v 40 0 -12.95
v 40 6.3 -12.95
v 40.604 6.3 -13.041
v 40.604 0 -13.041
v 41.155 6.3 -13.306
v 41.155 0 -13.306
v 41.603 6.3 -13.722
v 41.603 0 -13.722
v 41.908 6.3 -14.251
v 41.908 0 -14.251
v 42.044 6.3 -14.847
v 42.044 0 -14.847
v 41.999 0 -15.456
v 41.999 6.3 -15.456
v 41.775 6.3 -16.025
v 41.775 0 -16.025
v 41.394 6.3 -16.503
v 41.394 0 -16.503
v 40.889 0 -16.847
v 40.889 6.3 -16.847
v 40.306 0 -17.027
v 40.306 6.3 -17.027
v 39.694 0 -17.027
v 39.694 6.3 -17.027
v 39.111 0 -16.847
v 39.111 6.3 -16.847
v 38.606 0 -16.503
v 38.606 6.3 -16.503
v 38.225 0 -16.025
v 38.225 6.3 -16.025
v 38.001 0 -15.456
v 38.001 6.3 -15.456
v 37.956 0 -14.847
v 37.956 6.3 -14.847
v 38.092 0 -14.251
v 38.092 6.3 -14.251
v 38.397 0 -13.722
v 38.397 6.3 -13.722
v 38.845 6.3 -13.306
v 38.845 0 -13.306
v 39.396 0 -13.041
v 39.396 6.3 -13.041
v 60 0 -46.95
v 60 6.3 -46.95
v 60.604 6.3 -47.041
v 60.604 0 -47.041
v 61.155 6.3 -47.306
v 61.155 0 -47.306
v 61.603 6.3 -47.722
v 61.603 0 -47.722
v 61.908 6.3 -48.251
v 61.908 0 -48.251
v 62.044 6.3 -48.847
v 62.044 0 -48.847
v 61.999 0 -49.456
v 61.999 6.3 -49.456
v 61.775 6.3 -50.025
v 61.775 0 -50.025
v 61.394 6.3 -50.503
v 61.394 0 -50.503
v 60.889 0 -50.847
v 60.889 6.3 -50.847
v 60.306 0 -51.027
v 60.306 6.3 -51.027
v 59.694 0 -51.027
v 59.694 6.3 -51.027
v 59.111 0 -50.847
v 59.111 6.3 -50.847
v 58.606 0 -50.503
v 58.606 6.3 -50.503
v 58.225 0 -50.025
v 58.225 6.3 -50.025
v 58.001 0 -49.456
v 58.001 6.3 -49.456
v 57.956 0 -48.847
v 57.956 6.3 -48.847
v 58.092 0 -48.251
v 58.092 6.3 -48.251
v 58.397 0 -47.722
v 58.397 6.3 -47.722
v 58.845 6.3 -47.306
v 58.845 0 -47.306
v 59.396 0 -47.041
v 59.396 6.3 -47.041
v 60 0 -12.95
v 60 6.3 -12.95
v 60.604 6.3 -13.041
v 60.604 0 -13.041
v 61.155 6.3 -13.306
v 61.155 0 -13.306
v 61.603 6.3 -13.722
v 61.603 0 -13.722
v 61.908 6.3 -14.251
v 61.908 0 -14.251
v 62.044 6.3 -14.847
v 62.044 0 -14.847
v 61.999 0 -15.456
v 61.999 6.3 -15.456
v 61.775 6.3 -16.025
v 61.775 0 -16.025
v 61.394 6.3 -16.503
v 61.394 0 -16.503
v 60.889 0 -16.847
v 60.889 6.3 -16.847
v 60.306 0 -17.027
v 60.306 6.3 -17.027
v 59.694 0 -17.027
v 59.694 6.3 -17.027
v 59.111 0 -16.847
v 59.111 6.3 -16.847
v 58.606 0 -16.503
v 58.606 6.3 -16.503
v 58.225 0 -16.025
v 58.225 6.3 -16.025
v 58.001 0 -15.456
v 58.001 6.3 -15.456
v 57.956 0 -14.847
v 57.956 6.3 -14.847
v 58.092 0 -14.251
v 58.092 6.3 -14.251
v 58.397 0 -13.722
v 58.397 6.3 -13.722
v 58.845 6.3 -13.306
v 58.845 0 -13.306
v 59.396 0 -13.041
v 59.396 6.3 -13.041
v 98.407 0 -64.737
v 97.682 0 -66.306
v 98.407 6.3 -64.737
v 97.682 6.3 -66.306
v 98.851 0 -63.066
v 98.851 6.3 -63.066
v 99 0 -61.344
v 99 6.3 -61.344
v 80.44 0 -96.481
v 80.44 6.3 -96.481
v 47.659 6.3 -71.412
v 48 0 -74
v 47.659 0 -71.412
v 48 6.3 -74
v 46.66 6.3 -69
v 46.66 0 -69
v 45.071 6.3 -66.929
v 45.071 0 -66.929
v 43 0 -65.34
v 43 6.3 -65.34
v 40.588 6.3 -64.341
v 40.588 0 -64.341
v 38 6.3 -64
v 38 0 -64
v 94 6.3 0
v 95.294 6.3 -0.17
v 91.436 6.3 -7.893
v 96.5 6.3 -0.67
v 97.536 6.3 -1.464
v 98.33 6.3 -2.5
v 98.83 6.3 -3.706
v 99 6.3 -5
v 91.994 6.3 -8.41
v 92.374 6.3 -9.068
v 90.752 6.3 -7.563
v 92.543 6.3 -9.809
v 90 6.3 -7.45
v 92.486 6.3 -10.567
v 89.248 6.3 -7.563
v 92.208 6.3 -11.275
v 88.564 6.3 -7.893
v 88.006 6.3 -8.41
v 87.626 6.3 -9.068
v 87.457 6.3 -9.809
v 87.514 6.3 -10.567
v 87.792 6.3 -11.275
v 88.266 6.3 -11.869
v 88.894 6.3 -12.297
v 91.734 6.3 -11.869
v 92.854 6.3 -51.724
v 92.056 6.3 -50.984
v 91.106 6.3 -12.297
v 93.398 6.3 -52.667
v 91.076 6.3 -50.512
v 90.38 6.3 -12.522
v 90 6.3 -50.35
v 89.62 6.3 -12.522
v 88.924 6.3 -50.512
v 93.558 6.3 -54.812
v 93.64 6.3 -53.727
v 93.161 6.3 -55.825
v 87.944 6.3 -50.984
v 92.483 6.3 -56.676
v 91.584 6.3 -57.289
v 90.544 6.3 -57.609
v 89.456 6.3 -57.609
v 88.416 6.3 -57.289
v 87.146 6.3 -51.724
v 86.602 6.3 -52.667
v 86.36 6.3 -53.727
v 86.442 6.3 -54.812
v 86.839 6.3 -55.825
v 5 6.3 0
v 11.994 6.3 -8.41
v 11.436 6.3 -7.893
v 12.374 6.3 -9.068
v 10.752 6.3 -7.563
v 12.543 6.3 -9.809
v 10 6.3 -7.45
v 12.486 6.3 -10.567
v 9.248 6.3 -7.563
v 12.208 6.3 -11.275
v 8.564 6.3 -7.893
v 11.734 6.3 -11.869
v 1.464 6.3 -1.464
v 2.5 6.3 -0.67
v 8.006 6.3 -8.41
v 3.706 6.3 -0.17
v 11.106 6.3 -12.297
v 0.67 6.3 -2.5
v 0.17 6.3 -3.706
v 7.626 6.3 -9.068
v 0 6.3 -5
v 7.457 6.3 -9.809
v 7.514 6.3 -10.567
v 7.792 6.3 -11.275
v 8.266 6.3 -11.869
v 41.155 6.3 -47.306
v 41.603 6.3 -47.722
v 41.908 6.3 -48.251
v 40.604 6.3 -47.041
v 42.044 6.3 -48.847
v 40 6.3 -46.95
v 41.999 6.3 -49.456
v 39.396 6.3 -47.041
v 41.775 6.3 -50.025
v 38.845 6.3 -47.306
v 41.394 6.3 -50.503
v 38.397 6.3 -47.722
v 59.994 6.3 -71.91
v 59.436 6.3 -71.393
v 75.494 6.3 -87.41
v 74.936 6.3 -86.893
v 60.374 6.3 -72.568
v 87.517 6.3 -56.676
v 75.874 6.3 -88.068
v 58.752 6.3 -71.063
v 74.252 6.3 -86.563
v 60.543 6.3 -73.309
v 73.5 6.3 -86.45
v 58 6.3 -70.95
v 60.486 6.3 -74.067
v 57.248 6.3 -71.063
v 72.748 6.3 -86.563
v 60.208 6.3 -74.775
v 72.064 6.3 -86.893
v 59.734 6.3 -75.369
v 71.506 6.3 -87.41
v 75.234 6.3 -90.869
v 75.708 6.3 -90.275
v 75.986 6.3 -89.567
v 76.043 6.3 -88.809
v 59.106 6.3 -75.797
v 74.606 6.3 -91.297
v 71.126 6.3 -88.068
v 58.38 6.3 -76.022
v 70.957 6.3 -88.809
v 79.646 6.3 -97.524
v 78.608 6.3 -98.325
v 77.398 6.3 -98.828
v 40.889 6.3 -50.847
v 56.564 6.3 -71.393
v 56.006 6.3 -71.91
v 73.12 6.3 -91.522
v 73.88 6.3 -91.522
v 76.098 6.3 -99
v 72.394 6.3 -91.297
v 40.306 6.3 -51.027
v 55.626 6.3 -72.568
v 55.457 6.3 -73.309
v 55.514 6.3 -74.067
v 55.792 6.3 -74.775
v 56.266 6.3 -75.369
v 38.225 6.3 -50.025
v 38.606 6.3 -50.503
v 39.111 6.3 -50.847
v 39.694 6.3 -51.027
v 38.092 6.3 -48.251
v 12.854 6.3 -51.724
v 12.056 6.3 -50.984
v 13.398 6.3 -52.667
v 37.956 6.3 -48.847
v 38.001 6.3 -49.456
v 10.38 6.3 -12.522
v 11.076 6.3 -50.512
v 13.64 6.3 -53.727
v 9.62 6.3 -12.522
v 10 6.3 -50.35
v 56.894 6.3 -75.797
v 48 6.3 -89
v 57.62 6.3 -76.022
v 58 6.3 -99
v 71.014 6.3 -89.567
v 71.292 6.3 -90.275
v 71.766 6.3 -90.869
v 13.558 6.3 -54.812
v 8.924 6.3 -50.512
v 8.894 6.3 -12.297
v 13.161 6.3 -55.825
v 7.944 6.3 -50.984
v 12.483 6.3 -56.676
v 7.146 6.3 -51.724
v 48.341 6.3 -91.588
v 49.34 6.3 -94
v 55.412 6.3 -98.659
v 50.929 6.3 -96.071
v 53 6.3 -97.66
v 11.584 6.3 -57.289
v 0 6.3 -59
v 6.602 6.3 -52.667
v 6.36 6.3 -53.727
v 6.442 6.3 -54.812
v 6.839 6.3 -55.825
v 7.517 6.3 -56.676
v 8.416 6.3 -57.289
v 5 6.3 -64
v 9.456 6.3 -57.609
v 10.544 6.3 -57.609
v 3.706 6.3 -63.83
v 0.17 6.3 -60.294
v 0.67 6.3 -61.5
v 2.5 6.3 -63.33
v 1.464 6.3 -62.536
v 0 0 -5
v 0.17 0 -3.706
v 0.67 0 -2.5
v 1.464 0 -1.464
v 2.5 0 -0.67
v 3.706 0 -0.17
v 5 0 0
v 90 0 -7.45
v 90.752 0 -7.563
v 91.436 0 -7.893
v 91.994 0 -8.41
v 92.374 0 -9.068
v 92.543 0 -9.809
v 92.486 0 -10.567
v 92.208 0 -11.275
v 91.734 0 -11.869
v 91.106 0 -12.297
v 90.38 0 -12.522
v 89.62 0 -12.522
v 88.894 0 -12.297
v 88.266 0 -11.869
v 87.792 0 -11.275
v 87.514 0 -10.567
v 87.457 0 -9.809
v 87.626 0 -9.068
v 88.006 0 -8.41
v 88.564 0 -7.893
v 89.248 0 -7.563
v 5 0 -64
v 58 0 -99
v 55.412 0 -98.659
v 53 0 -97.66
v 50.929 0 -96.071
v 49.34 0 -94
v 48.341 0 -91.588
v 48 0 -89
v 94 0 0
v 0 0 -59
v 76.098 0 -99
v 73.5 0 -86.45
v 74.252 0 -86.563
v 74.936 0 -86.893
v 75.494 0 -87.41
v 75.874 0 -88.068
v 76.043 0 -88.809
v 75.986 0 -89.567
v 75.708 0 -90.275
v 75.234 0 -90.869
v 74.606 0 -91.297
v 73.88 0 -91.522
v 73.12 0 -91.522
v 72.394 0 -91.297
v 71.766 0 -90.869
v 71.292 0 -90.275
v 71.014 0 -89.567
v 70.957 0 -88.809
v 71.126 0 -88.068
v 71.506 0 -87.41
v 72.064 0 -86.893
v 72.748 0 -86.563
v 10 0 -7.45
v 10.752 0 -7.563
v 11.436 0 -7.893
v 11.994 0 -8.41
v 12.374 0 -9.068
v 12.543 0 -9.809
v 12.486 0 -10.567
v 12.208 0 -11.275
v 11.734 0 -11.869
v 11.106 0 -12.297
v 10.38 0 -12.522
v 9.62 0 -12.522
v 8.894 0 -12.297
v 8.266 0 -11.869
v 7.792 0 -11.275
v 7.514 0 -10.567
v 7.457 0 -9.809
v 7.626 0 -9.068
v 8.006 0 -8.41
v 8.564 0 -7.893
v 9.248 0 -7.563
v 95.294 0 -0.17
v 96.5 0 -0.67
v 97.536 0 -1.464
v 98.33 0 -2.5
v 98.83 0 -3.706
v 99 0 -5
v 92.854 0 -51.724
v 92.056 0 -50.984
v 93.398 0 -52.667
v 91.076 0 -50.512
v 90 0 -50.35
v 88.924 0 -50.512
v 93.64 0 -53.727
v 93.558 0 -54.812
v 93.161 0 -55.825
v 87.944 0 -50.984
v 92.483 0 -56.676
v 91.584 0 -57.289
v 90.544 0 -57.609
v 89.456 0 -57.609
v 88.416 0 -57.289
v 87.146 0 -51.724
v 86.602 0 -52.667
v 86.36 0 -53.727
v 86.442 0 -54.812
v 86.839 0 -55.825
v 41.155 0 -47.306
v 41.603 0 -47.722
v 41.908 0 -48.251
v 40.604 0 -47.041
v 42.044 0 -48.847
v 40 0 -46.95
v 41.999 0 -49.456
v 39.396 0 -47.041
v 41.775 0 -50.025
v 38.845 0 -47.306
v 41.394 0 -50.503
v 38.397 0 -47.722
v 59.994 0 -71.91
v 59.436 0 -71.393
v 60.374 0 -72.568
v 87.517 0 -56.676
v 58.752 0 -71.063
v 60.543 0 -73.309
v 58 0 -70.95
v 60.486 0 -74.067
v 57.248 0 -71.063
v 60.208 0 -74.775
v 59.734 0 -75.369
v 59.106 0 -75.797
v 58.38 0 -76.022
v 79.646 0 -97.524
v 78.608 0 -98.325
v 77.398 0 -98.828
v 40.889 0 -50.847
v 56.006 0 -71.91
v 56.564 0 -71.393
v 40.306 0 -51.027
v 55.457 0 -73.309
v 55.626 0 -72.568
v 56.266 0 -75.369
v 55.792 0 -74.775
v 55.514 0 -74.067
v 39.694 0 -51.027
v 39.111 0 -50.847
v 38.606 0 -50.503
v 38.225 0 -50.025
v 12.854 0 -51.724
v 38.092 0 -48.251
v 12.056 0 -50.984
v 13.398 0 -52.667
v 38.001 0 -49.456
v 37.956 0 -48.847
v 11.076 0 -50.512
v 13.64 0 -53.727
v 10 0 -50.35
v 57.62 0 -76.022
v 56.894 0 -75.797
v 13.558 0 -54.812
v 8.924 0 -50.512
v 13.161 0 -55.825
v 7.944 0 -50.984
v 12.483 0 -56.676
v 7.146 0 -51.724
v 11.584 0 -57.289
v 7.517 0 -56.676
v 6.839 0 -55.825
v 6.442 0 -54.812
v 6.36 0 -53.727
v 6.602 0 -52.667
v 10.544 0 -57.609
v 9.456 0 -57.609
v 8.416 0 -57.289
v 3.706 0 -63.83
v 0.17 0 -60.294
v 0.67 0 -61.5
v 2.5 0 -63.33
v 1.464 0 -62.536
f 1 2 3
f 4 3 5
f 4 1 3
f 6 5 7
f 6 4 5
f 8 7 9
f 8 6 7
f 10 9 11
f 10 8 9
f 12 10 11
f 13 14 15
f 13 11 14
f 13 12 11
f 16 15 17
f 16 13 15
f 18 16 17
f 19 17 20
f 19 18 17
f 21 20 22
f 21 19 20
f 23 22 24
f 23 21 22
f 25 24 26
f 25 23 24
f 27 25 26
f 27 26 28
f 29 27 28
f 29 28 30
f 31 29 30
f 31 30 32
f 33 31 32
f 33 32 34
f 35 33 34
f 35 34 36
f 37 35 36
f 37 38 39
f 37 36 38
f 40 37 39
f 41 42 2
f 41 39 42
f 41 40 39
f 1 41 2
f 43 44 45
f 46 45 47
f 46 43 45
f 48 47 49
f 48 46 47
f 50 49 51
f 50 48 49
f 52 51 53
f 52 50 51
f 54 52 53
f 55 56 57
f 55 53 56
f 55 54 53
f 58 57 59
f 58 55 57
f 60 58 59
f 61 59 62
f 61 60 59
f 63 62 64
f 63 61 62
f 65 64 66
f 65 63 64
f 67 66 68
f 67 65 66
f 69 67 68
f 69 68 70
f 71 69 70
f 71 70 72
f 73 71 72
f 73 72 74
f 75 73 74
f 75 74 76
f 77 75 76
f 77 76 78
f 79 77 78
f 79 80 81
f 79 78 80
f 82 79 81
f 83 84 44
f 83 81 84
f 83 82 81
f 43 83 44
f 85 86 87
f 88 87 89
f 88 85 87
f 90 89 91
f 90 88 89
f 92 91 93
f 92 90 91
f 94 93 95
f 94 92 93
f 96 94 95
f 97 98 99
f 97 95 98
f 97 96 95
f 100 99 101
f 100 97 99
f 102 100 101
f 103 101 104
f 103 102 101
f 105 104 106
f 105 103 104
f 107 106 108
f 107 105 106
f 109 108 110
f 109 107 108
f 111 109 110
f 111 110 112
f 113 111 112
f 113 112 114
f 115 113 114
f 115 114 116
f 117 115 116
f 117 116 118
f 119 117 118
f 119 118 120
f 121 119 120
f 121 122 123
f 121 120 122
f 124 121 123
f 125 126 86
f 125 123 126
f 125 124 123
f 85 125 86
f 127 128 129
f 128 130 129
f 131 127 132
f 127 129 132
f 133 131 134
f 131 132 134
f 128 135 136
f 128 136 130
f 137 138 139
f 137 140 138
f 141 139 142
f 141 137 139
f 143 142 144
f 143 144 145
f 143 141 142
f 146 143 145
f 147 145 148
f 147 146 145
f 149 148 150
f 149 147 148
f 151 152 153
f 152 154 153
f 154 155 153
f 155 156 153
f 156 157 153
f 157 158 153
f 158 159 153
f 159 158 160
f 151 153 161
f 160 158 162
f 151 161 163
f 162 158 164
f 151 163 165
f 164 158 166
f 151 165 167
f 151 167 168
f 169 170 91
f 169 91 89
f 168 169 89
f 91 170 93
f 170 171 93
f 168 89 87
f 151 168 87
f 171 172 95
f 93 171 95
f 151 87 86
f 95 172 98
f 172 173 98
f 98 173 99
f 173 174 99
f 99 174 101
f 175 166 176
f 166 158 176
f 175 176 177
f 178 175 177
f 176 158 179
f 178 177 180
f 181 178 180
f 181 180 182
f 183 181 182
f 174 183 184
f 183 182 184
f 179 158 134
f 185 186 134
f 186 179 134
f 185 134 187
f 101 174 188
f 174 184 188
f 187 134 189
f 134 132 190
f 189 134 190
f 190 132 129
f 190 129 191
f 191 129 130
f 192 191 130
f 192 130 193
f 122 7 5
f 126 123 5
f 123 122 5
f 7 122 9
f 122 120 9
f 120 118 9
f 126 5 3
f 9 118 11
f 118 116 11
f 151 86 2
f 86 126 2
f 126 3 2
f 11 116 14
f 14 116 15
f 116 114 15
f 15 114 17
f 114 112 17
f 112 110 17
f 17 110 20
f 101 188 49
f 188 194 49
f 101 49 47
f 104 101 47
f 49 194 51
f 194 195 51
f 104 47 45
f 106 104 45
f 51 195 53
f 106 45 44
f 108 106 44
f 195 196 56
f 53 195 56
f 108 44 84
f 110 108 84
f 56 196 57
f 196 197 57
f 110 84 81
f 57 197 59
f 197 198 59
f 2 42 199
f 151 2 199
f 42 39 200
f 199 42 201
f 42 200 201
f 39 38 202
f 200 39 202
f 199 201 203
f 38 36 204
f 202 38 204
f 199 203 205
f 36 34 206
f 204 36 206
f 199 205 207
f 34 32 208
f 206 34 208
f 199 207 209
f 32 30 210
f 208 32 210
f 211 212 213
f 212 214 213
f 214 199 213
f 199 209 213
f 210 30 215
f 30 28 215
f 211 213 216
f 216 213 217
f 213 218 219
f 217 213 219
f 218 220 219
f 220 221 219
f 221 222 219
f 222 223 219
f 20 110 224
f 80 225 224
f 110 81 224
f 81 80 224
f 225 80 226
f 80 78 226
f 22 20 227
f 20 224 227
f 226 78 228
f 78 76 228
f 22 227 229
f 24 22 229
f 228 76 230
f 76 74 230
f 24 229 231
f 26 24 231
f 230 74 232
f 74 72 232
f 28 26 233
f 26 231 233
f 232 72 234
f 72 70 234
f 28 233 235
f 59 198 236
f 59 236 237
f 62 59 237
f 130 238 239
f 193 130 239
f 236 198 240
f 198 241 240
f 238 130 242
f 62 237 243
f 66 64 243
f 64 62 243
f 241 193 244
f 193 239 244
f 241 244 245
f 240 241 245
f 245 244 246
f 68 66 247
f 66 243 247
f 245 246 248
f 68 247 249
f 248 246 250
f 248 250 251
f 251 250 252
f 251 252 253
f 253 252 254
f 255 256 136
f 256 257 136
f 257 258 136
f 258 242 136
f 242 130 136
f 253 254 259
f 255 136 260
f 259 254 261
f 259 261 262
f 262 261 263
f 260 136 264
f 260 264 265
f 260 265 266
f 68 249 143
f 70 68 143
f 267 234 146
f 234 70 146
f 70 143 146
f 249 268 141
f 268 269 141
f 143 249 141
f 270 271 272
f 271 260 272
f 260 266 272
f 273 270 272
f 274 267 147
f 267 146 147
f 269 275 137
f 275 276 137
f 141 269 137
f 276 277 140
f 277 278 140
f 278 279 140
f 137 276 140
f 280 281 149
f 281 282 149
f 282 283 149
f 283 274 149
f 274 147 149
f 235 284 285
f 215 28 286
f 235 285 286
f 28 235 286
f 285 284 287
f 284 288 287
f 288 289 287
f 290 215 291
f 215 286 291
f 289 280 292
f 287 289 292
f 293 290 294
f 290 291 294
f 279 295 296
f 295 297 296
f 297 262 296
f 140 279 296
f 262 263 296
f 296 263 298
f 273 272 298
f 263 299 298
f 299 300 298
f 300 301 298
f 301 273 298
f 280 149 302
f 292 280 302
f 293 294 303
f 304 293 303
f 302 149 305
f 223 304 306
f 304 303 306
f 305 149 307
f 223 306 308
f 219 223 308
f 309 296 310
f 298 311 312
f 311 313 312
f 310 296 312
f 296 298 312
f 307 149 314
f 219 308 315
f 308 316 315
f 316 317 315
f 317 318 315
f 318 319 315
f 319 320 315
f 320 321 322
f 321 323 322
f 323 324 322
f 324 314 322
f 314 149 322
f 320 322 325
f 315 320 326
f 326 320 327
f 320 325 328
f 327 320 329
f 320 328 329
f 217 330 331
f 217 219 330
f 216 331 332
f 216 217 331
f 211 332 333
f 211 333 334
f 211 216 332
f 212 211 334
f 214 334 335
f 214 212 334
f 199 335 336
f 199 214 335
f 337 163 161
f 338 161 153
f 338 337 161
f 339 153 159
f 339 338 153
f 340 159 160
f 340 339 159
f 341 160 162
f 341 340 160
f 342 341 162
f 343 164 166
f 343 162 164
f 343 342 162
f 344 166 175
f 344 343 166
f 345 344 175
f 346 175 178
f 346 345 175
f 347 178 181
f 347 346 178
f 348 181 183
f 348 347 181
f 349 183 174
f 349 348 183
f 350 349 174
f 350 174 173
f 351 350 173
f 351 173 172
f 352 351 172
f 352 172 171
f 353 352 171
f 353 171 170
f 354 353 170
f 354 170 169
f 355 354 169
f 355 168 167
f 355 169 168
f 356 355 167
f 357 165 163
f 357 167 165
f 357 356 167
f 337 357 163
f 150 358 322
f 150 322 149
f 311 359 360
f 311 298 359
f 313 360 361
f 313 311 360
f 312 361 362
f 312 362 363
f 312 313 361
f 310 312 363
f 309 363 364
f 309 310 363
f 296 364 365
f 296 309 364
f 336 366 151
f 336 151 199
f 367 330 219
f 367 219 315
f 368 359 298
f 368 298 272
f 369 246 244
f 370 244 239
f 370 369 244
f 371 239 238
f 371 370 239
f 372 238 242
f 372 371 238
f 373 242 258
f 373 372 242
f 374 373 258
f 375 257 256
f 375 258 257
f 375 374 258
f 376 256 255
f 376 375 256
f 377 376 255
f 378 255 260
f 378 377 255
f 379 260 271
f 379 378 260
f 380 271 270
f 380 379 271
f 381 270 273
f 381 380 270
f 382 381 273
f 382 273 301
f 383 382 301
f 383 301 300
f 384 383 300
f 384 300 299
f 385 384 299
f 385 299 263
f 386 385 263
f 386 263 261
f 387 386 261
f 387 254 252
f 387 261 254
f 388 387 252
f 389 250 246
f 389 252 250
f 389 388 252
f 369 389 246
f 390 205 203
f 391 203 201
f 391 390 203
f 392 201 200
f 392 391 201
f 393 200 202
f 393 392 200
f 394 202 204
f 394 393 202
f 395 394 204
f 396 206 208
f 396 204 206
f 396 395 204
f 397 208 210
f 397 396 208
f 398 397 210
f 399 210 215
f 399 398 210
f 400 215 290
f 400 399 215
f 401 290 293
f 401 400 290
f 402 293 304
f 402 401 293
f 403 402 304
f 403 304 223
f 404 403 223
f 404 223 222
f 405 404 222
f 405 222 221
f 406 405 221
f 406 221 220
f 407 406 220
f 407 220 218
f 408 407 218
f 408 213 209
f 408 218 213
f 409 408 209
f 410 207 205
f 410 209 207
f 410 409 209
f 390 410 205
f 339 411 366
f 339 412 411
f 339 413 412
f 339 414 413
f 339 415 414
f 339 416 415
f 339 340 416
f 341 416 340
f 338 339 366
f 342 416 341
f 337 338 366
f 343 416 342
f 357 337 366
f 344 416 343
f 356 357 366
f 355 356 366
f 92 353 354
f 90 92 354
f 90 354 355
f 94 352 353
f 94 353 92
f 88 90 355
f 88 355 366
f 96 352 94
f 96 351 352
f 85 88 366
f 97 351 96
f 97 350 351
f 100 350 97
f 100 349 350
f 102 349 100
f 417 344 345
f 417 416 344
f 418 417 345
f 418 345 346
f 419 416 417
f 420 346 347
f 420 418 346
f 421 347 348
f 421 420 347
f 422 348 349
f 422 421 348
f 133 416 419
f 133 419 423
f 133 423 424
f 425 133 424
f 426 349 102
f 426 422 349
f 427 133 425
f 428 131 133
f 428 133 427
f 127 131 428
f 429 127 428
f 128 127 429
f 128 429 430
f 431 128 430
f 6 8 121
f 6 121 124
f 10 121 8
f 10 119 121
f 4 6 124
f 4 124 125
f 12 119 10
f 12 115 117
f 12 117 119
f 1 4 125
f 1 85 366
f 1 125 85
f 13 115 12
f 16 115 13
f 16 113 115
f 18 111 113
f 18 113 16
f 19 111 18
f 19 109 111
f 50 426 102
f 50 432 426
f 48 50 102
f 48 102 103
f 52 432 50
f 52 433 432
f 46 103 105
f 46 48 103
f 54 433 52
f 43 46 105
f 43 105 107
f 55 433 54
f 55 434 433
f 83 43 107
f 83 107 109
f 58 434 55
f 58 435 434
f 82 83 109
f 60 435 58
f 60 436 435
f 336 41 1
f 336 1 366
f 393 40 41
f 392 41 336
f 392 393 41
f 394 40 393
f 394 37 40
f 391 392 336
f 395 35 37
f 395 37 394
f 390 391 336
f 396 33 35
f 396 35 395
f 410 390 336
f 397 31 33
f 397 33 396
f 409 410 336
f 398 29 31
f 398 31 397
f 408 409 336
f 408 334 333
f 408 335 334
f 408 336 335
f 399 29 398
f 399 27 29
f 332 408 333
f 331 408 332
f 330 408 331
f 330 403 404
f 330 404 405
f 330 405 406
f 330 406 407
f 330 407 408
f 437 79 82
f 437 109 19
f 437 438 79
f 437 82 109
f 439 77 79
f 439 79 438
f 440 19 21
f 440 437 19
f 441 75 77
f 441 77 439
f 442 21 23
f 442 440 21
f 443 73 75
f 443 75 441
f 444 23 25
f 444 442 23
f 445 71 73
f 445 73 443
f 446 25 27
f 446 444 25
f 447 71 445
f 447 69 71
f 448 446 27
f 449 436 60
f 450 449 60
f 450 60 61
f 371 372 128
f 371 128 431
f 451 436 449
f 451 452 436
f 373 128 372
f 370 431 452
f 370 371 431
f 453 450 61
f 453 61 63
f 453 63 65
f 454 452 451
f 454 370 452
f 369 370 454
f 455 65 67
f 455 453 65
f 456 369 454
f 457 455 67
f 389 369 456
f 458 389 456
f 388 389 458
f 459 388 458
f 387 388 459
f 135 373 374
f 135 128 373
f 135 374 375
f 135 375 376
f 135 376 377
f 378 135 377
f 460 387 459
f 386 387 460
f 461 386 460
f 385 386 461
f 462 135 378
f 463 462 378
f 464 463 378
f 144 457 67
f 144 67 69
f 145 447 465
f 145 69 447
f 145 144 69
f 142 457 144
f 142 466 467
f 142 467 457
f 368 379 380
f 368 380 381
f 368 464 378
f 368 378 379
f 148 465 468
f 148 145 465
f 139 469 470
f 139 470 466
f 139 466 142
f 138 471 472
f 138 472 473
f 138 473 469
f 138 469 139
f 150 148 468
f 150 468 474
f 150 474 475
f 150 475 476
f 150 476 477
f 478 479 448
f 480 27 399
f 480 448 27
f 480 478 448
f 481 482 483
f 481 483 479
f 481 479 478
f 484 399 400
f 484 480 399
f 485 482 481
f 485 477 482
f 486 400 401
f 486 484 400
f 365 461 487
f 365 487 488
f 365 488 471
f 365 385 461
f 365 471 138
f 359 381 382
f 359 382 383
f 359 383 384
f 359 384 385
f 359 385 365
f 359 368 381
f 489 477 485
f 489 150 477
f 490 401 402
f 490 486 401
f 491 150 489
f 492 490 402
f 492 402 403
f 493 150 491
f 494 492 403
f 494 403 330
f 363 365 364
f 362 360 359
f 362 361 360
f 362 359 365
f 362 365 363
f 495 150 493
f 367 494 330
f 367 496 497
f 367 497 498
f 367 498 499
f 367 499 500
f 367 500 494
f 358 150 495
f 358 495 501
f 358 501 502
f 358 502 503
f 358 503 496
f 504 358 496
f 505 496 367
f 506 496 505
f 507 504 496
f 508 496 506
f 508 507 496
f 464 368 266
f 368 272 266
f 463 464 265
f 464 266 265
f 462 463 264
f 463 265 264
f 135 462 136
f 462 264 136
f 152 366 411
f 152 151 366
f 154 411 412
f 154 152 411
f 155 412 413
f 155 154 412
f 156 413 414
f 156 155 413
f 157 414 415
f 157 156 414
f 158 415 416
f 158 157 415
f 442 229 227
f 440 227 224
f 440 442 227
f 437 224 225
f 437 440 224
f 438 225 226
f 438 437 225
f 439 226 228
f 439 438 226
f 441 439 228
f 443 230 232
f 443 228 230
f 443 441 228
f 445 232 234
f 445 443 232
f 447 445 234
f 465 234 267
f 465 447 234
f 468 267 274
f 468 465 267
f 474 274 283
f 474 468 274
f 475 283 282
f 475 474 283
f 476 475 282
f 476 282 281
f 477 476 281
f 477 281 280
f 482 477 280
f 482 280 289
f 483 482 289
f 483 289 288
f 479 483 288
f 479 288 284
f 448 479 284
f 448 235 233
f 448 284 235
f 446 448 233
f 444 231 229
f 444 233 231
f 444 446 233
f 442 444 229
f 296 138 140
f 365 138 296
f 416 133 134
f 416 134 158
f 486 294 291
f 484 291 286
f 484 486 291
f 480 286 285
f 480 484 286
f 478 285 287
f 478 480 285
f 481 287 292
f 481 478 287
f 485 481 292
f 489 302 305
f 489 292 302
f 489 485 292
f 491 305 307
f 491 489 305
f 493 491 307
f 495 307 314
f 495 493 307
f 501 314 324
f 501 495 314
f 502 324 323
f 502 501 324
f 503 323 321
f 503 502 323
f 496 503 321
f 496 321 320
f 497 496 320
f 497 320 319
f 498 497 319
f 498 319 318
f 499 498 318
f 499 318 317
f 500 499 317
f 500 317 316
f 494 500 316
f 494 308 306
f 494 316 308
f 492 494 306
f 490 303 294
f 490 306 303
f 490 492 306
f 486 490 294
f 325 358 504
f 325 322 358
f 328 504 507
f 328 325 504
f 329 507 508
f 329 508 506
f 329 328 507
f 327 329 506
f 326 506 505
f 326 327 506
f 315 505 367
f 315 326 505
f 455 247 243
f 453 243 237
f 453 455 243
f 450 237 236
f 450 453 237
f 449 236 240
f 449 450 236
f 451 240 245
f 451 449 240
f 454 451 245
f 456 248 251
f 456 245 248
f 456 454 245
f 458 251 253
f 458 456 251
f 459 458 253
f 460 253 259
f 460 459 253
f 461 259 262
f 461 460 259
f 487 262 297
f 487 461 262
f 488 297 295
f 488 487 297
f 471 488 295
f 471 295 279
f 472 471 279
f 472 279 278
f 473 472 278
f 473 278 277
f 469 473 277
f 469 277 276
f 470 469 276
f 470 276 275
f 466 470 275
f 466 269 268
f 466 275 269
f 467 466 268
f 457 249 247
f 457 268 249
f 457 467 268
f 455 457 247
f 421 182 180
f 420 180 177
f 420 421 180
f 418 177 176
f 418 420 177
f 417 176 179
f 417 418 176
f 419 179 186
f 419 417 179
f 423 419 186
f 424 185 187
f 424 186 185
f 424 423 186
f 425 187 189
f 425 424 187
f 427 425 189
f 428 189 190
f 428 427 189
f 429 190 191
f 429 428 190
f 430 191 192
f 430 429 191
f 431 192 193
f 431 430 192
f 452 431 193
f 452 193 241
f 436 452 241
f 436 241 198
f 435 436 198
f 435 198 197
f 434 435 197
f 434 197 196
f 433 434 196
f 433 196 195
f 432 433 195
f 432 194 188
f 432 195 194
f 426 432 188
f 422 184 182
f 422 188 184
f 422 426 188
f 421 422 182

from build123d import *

# Parameters (mm, degrees)
BOSS_EXTRUDE2_DEPTH = 6.3
SKETCH1_7_R         = 2.55
CUT_EXTRUDE3_DEPTH  = 141.148813766
SKETCH1_8_R         = 3.65
CUT_EXTRUDE4_DEPTH  = 141.148813766
SKETCH1_9_R         = 2.55
CUT_EXTRUDE5_DEPTH  = 141.148813766
SKETCH1_10_R        = 3.65
CUT_EXTRUDE6_DEPTH  = 141.148813766
SKETCH1_11_R        = 2.05
CUT_EXTRUDE8_DEPTH  = 141.148813766
SKETCH1_12_R        = 2.05
CUT_EXTRUDE10_DEPTH = 141.148813766
SKETCH1_13_R        = 2.55
CUT_EXTRUDE11_DEPTH = 141.148813766
SKETCH1_14_R        = 2.05
CUT_EXTRUDE12_DEPTH = 141.148813766
SKETCH1_15_R        = 2.05
CUT_EXTRUDE13_DEPTH = 141.148813766
SKETCH1_16_R        = 2.55
CUT_EXTRUDE14_DEPTH = 141.148813766
FILLET1_R           = 5
FILLET2_R           = 5
FILLET3_R           = 10
FILLET4_R           = 10
FILLET5_R           = 10


with BuildPart() as part:
    # Sketch1 → Boss-Extrude2 (new body)
    with BuildSketch(Plane(origin=(0, 0, 0), x_dir=(1, 0, 0), z_dir=(0, 1, 0))):
        Polygon((0, 64), (48, 64), (48, 99), (79, 99), (99, 64), (99, 0), (0, 0), align=None)
    extrude(amount=BOSS_EXTRUDE2_DEPTH)

    # Sketch1<7> → Cut-Extrude3 (cut, through all)
    with BuildSketch(Plane(origin=(0, 0, 0), x_dir=(1, 0, 0), z_dir=(0, 1, 0))):
        with Locations((73.5, 89)):
            Circle(SKETCH1_7_R)
    extrude(amount=CUT_EXTRUDE3_DEPTH, mode=Mode.SUBTRACT)

    # Sketch1<8> → Cut-Extrude4 (cut, through all)
    with BuildSketch(Plane(origin=(0, 0, 0), x_dir=(1, 0, 0), z_dir=(0, 1, 0))):
        with Locations((90, 54)):
            Circle(SKETCH1_8_R)
    extrude(amount=CUT_EXTRUDE4_DEPTH, mode=Mode.SUBTRACT)

    # Sketch1<9> → Cut-Extrude5 (cut, through all)
    with BuildSketch(Plane(origin=(0, 0, 0), x_dir=(1, 0, 0), z_dir=(0, 1, 0))):
        with Locations((58, 73.5)):
            Circle(SKETCH1_9_R)
    extrude(amount=CUT_EXTRUDE5_DEPTH, mode=Mode.SUBTRACT)

    # Sketch1<10> → Cut-Extrude6 (cut, through all)
    with BuildSketch(Plane(origin=(0, 0, 0), x_dir=(1, 0, 0), z_dir=(0, 1, 0))):
        with Locations((10, 54)):
            Circle(SKETCH1_10_R)
    extrude(amount=CUT_EXTRUDE6_DEPTH, mode=Mode.SUBTRACT)

    # Sketch1<11> → Cut-Extrude8 (cut, through all)
    with BuildSketch(Plane(origin=(0, 0, 0), x_dir=(1, 0, 0), z_dir=(0, 1, 0))):
        with Locations((60, 49)):
            Circle(SKETCH1_11_R)
    extrude(amount=CUT_EXTRUDE8_DEPTH, mode=Mode.SUBTRACT)

    # Sketch1<12> → Cut-Extrude10 (cut, through all)
    with BuildSketch(Plane(origin=(0, 0, 0), x_dir=(1, 0, 0), z_dir=(0, 1, 0))):
        with Locations((40, 49)):
            Circle(SKETCH1_12_R)
    extrude(amount=CUT_EXTRUDE10_DEPTH, mode=Mode.SUBTRACT)

    # Sketch1<13> → Cut-Extrude11 (cut, through all)
    with BuildSketch(Plane(origin=(0, 0, 0), x_dir=(1, 0, 0), z_dir=(0, 1, 0))):
        with Locations((90, 10)):
            Circle(SKETCH1_13_R)
    extrude(amount=CUT_EXTRUDE11_DEPTH, mode=Mode.SUBTRACT)

    # Sketch1<14> → Cut-Extrude12 (cut, through all)
    with BuildSketch(Plane(origin=(0, 0, 0), x_dir=(1, 0, 0), z_dir=(0, 1, 0))):
        with Locations((60, 15)):
            Circle(SKETCH1_14_R)
    extrude(amount=CUT_EXTRUDE12_DEPTH, mode=Mode.SUBTRACT)

    # Sketch1<15> → Cut-Extrude13 (cut, through all)
    with BuildSketch(Plane(origin=(0, 0, 0), x_dir=(1, 0, 0), z_dir=(0, 1, 0))):
        with Locations((40, 15)):
            Circle(SKETCH1_15_R)
    extrude(amount=CUT_EXTRUDE13_DEPTH, mode=Mode.SUBTRACT)

    # Sketch1<16> → Cut-Extrude14 (cut, through all)
    with BuildSketch(Plane(origin=(0, 0, 0), x_dir=(1, 0, 0), z_dir=(0, 1, 0))):
        with Locations((10, 10)):
            Circle(SKETCH1_16_R)
    extrude(amount=CUT_EXTRUDE14_DEPTH, mode=Mode.SUBTRACT)

    # Fillet1
    fillet1_edges = [part.edges().sort_by_distance(p)[0] for p in [
        (0, 3.15, -64),
        (0, 3.15, 0),
        (99, 3.15, 0),
    ]]
    fillet(fillet1_edges, radius=FILLET1_R)

    # Fillet2
    fillet2_edges = [part.edges().sort_by_distance(p)[0] for p in [
        (79, 3.15, -99),
    ]]
    fillet(fillet2_edges, radius=FILLET2_R)

    # Fillet3
    fillet3_edges = [part.edges().sort_by_distance(p)[0] for p in [
        (48, 3.15, -99),
    ]]
    fillet(fillet3_edges, radius=FILLET3_R)

    # Fillet4
    fillet4_edges = [part.edges().sort_by_distance(p)[0] for p in [
        (99, 3.15, -64),
    ]]
    fillet(fillet4_edges, radius=FILLET4_R)

    # Fillet5
    fillet5_edges = [part.edges().sort_by_distance(p)[0] for p in [
        (48, 3.15, -64),
    ]]
    fillet(fillet5_edges, radius=FILLET5_R)


solid = part.part
